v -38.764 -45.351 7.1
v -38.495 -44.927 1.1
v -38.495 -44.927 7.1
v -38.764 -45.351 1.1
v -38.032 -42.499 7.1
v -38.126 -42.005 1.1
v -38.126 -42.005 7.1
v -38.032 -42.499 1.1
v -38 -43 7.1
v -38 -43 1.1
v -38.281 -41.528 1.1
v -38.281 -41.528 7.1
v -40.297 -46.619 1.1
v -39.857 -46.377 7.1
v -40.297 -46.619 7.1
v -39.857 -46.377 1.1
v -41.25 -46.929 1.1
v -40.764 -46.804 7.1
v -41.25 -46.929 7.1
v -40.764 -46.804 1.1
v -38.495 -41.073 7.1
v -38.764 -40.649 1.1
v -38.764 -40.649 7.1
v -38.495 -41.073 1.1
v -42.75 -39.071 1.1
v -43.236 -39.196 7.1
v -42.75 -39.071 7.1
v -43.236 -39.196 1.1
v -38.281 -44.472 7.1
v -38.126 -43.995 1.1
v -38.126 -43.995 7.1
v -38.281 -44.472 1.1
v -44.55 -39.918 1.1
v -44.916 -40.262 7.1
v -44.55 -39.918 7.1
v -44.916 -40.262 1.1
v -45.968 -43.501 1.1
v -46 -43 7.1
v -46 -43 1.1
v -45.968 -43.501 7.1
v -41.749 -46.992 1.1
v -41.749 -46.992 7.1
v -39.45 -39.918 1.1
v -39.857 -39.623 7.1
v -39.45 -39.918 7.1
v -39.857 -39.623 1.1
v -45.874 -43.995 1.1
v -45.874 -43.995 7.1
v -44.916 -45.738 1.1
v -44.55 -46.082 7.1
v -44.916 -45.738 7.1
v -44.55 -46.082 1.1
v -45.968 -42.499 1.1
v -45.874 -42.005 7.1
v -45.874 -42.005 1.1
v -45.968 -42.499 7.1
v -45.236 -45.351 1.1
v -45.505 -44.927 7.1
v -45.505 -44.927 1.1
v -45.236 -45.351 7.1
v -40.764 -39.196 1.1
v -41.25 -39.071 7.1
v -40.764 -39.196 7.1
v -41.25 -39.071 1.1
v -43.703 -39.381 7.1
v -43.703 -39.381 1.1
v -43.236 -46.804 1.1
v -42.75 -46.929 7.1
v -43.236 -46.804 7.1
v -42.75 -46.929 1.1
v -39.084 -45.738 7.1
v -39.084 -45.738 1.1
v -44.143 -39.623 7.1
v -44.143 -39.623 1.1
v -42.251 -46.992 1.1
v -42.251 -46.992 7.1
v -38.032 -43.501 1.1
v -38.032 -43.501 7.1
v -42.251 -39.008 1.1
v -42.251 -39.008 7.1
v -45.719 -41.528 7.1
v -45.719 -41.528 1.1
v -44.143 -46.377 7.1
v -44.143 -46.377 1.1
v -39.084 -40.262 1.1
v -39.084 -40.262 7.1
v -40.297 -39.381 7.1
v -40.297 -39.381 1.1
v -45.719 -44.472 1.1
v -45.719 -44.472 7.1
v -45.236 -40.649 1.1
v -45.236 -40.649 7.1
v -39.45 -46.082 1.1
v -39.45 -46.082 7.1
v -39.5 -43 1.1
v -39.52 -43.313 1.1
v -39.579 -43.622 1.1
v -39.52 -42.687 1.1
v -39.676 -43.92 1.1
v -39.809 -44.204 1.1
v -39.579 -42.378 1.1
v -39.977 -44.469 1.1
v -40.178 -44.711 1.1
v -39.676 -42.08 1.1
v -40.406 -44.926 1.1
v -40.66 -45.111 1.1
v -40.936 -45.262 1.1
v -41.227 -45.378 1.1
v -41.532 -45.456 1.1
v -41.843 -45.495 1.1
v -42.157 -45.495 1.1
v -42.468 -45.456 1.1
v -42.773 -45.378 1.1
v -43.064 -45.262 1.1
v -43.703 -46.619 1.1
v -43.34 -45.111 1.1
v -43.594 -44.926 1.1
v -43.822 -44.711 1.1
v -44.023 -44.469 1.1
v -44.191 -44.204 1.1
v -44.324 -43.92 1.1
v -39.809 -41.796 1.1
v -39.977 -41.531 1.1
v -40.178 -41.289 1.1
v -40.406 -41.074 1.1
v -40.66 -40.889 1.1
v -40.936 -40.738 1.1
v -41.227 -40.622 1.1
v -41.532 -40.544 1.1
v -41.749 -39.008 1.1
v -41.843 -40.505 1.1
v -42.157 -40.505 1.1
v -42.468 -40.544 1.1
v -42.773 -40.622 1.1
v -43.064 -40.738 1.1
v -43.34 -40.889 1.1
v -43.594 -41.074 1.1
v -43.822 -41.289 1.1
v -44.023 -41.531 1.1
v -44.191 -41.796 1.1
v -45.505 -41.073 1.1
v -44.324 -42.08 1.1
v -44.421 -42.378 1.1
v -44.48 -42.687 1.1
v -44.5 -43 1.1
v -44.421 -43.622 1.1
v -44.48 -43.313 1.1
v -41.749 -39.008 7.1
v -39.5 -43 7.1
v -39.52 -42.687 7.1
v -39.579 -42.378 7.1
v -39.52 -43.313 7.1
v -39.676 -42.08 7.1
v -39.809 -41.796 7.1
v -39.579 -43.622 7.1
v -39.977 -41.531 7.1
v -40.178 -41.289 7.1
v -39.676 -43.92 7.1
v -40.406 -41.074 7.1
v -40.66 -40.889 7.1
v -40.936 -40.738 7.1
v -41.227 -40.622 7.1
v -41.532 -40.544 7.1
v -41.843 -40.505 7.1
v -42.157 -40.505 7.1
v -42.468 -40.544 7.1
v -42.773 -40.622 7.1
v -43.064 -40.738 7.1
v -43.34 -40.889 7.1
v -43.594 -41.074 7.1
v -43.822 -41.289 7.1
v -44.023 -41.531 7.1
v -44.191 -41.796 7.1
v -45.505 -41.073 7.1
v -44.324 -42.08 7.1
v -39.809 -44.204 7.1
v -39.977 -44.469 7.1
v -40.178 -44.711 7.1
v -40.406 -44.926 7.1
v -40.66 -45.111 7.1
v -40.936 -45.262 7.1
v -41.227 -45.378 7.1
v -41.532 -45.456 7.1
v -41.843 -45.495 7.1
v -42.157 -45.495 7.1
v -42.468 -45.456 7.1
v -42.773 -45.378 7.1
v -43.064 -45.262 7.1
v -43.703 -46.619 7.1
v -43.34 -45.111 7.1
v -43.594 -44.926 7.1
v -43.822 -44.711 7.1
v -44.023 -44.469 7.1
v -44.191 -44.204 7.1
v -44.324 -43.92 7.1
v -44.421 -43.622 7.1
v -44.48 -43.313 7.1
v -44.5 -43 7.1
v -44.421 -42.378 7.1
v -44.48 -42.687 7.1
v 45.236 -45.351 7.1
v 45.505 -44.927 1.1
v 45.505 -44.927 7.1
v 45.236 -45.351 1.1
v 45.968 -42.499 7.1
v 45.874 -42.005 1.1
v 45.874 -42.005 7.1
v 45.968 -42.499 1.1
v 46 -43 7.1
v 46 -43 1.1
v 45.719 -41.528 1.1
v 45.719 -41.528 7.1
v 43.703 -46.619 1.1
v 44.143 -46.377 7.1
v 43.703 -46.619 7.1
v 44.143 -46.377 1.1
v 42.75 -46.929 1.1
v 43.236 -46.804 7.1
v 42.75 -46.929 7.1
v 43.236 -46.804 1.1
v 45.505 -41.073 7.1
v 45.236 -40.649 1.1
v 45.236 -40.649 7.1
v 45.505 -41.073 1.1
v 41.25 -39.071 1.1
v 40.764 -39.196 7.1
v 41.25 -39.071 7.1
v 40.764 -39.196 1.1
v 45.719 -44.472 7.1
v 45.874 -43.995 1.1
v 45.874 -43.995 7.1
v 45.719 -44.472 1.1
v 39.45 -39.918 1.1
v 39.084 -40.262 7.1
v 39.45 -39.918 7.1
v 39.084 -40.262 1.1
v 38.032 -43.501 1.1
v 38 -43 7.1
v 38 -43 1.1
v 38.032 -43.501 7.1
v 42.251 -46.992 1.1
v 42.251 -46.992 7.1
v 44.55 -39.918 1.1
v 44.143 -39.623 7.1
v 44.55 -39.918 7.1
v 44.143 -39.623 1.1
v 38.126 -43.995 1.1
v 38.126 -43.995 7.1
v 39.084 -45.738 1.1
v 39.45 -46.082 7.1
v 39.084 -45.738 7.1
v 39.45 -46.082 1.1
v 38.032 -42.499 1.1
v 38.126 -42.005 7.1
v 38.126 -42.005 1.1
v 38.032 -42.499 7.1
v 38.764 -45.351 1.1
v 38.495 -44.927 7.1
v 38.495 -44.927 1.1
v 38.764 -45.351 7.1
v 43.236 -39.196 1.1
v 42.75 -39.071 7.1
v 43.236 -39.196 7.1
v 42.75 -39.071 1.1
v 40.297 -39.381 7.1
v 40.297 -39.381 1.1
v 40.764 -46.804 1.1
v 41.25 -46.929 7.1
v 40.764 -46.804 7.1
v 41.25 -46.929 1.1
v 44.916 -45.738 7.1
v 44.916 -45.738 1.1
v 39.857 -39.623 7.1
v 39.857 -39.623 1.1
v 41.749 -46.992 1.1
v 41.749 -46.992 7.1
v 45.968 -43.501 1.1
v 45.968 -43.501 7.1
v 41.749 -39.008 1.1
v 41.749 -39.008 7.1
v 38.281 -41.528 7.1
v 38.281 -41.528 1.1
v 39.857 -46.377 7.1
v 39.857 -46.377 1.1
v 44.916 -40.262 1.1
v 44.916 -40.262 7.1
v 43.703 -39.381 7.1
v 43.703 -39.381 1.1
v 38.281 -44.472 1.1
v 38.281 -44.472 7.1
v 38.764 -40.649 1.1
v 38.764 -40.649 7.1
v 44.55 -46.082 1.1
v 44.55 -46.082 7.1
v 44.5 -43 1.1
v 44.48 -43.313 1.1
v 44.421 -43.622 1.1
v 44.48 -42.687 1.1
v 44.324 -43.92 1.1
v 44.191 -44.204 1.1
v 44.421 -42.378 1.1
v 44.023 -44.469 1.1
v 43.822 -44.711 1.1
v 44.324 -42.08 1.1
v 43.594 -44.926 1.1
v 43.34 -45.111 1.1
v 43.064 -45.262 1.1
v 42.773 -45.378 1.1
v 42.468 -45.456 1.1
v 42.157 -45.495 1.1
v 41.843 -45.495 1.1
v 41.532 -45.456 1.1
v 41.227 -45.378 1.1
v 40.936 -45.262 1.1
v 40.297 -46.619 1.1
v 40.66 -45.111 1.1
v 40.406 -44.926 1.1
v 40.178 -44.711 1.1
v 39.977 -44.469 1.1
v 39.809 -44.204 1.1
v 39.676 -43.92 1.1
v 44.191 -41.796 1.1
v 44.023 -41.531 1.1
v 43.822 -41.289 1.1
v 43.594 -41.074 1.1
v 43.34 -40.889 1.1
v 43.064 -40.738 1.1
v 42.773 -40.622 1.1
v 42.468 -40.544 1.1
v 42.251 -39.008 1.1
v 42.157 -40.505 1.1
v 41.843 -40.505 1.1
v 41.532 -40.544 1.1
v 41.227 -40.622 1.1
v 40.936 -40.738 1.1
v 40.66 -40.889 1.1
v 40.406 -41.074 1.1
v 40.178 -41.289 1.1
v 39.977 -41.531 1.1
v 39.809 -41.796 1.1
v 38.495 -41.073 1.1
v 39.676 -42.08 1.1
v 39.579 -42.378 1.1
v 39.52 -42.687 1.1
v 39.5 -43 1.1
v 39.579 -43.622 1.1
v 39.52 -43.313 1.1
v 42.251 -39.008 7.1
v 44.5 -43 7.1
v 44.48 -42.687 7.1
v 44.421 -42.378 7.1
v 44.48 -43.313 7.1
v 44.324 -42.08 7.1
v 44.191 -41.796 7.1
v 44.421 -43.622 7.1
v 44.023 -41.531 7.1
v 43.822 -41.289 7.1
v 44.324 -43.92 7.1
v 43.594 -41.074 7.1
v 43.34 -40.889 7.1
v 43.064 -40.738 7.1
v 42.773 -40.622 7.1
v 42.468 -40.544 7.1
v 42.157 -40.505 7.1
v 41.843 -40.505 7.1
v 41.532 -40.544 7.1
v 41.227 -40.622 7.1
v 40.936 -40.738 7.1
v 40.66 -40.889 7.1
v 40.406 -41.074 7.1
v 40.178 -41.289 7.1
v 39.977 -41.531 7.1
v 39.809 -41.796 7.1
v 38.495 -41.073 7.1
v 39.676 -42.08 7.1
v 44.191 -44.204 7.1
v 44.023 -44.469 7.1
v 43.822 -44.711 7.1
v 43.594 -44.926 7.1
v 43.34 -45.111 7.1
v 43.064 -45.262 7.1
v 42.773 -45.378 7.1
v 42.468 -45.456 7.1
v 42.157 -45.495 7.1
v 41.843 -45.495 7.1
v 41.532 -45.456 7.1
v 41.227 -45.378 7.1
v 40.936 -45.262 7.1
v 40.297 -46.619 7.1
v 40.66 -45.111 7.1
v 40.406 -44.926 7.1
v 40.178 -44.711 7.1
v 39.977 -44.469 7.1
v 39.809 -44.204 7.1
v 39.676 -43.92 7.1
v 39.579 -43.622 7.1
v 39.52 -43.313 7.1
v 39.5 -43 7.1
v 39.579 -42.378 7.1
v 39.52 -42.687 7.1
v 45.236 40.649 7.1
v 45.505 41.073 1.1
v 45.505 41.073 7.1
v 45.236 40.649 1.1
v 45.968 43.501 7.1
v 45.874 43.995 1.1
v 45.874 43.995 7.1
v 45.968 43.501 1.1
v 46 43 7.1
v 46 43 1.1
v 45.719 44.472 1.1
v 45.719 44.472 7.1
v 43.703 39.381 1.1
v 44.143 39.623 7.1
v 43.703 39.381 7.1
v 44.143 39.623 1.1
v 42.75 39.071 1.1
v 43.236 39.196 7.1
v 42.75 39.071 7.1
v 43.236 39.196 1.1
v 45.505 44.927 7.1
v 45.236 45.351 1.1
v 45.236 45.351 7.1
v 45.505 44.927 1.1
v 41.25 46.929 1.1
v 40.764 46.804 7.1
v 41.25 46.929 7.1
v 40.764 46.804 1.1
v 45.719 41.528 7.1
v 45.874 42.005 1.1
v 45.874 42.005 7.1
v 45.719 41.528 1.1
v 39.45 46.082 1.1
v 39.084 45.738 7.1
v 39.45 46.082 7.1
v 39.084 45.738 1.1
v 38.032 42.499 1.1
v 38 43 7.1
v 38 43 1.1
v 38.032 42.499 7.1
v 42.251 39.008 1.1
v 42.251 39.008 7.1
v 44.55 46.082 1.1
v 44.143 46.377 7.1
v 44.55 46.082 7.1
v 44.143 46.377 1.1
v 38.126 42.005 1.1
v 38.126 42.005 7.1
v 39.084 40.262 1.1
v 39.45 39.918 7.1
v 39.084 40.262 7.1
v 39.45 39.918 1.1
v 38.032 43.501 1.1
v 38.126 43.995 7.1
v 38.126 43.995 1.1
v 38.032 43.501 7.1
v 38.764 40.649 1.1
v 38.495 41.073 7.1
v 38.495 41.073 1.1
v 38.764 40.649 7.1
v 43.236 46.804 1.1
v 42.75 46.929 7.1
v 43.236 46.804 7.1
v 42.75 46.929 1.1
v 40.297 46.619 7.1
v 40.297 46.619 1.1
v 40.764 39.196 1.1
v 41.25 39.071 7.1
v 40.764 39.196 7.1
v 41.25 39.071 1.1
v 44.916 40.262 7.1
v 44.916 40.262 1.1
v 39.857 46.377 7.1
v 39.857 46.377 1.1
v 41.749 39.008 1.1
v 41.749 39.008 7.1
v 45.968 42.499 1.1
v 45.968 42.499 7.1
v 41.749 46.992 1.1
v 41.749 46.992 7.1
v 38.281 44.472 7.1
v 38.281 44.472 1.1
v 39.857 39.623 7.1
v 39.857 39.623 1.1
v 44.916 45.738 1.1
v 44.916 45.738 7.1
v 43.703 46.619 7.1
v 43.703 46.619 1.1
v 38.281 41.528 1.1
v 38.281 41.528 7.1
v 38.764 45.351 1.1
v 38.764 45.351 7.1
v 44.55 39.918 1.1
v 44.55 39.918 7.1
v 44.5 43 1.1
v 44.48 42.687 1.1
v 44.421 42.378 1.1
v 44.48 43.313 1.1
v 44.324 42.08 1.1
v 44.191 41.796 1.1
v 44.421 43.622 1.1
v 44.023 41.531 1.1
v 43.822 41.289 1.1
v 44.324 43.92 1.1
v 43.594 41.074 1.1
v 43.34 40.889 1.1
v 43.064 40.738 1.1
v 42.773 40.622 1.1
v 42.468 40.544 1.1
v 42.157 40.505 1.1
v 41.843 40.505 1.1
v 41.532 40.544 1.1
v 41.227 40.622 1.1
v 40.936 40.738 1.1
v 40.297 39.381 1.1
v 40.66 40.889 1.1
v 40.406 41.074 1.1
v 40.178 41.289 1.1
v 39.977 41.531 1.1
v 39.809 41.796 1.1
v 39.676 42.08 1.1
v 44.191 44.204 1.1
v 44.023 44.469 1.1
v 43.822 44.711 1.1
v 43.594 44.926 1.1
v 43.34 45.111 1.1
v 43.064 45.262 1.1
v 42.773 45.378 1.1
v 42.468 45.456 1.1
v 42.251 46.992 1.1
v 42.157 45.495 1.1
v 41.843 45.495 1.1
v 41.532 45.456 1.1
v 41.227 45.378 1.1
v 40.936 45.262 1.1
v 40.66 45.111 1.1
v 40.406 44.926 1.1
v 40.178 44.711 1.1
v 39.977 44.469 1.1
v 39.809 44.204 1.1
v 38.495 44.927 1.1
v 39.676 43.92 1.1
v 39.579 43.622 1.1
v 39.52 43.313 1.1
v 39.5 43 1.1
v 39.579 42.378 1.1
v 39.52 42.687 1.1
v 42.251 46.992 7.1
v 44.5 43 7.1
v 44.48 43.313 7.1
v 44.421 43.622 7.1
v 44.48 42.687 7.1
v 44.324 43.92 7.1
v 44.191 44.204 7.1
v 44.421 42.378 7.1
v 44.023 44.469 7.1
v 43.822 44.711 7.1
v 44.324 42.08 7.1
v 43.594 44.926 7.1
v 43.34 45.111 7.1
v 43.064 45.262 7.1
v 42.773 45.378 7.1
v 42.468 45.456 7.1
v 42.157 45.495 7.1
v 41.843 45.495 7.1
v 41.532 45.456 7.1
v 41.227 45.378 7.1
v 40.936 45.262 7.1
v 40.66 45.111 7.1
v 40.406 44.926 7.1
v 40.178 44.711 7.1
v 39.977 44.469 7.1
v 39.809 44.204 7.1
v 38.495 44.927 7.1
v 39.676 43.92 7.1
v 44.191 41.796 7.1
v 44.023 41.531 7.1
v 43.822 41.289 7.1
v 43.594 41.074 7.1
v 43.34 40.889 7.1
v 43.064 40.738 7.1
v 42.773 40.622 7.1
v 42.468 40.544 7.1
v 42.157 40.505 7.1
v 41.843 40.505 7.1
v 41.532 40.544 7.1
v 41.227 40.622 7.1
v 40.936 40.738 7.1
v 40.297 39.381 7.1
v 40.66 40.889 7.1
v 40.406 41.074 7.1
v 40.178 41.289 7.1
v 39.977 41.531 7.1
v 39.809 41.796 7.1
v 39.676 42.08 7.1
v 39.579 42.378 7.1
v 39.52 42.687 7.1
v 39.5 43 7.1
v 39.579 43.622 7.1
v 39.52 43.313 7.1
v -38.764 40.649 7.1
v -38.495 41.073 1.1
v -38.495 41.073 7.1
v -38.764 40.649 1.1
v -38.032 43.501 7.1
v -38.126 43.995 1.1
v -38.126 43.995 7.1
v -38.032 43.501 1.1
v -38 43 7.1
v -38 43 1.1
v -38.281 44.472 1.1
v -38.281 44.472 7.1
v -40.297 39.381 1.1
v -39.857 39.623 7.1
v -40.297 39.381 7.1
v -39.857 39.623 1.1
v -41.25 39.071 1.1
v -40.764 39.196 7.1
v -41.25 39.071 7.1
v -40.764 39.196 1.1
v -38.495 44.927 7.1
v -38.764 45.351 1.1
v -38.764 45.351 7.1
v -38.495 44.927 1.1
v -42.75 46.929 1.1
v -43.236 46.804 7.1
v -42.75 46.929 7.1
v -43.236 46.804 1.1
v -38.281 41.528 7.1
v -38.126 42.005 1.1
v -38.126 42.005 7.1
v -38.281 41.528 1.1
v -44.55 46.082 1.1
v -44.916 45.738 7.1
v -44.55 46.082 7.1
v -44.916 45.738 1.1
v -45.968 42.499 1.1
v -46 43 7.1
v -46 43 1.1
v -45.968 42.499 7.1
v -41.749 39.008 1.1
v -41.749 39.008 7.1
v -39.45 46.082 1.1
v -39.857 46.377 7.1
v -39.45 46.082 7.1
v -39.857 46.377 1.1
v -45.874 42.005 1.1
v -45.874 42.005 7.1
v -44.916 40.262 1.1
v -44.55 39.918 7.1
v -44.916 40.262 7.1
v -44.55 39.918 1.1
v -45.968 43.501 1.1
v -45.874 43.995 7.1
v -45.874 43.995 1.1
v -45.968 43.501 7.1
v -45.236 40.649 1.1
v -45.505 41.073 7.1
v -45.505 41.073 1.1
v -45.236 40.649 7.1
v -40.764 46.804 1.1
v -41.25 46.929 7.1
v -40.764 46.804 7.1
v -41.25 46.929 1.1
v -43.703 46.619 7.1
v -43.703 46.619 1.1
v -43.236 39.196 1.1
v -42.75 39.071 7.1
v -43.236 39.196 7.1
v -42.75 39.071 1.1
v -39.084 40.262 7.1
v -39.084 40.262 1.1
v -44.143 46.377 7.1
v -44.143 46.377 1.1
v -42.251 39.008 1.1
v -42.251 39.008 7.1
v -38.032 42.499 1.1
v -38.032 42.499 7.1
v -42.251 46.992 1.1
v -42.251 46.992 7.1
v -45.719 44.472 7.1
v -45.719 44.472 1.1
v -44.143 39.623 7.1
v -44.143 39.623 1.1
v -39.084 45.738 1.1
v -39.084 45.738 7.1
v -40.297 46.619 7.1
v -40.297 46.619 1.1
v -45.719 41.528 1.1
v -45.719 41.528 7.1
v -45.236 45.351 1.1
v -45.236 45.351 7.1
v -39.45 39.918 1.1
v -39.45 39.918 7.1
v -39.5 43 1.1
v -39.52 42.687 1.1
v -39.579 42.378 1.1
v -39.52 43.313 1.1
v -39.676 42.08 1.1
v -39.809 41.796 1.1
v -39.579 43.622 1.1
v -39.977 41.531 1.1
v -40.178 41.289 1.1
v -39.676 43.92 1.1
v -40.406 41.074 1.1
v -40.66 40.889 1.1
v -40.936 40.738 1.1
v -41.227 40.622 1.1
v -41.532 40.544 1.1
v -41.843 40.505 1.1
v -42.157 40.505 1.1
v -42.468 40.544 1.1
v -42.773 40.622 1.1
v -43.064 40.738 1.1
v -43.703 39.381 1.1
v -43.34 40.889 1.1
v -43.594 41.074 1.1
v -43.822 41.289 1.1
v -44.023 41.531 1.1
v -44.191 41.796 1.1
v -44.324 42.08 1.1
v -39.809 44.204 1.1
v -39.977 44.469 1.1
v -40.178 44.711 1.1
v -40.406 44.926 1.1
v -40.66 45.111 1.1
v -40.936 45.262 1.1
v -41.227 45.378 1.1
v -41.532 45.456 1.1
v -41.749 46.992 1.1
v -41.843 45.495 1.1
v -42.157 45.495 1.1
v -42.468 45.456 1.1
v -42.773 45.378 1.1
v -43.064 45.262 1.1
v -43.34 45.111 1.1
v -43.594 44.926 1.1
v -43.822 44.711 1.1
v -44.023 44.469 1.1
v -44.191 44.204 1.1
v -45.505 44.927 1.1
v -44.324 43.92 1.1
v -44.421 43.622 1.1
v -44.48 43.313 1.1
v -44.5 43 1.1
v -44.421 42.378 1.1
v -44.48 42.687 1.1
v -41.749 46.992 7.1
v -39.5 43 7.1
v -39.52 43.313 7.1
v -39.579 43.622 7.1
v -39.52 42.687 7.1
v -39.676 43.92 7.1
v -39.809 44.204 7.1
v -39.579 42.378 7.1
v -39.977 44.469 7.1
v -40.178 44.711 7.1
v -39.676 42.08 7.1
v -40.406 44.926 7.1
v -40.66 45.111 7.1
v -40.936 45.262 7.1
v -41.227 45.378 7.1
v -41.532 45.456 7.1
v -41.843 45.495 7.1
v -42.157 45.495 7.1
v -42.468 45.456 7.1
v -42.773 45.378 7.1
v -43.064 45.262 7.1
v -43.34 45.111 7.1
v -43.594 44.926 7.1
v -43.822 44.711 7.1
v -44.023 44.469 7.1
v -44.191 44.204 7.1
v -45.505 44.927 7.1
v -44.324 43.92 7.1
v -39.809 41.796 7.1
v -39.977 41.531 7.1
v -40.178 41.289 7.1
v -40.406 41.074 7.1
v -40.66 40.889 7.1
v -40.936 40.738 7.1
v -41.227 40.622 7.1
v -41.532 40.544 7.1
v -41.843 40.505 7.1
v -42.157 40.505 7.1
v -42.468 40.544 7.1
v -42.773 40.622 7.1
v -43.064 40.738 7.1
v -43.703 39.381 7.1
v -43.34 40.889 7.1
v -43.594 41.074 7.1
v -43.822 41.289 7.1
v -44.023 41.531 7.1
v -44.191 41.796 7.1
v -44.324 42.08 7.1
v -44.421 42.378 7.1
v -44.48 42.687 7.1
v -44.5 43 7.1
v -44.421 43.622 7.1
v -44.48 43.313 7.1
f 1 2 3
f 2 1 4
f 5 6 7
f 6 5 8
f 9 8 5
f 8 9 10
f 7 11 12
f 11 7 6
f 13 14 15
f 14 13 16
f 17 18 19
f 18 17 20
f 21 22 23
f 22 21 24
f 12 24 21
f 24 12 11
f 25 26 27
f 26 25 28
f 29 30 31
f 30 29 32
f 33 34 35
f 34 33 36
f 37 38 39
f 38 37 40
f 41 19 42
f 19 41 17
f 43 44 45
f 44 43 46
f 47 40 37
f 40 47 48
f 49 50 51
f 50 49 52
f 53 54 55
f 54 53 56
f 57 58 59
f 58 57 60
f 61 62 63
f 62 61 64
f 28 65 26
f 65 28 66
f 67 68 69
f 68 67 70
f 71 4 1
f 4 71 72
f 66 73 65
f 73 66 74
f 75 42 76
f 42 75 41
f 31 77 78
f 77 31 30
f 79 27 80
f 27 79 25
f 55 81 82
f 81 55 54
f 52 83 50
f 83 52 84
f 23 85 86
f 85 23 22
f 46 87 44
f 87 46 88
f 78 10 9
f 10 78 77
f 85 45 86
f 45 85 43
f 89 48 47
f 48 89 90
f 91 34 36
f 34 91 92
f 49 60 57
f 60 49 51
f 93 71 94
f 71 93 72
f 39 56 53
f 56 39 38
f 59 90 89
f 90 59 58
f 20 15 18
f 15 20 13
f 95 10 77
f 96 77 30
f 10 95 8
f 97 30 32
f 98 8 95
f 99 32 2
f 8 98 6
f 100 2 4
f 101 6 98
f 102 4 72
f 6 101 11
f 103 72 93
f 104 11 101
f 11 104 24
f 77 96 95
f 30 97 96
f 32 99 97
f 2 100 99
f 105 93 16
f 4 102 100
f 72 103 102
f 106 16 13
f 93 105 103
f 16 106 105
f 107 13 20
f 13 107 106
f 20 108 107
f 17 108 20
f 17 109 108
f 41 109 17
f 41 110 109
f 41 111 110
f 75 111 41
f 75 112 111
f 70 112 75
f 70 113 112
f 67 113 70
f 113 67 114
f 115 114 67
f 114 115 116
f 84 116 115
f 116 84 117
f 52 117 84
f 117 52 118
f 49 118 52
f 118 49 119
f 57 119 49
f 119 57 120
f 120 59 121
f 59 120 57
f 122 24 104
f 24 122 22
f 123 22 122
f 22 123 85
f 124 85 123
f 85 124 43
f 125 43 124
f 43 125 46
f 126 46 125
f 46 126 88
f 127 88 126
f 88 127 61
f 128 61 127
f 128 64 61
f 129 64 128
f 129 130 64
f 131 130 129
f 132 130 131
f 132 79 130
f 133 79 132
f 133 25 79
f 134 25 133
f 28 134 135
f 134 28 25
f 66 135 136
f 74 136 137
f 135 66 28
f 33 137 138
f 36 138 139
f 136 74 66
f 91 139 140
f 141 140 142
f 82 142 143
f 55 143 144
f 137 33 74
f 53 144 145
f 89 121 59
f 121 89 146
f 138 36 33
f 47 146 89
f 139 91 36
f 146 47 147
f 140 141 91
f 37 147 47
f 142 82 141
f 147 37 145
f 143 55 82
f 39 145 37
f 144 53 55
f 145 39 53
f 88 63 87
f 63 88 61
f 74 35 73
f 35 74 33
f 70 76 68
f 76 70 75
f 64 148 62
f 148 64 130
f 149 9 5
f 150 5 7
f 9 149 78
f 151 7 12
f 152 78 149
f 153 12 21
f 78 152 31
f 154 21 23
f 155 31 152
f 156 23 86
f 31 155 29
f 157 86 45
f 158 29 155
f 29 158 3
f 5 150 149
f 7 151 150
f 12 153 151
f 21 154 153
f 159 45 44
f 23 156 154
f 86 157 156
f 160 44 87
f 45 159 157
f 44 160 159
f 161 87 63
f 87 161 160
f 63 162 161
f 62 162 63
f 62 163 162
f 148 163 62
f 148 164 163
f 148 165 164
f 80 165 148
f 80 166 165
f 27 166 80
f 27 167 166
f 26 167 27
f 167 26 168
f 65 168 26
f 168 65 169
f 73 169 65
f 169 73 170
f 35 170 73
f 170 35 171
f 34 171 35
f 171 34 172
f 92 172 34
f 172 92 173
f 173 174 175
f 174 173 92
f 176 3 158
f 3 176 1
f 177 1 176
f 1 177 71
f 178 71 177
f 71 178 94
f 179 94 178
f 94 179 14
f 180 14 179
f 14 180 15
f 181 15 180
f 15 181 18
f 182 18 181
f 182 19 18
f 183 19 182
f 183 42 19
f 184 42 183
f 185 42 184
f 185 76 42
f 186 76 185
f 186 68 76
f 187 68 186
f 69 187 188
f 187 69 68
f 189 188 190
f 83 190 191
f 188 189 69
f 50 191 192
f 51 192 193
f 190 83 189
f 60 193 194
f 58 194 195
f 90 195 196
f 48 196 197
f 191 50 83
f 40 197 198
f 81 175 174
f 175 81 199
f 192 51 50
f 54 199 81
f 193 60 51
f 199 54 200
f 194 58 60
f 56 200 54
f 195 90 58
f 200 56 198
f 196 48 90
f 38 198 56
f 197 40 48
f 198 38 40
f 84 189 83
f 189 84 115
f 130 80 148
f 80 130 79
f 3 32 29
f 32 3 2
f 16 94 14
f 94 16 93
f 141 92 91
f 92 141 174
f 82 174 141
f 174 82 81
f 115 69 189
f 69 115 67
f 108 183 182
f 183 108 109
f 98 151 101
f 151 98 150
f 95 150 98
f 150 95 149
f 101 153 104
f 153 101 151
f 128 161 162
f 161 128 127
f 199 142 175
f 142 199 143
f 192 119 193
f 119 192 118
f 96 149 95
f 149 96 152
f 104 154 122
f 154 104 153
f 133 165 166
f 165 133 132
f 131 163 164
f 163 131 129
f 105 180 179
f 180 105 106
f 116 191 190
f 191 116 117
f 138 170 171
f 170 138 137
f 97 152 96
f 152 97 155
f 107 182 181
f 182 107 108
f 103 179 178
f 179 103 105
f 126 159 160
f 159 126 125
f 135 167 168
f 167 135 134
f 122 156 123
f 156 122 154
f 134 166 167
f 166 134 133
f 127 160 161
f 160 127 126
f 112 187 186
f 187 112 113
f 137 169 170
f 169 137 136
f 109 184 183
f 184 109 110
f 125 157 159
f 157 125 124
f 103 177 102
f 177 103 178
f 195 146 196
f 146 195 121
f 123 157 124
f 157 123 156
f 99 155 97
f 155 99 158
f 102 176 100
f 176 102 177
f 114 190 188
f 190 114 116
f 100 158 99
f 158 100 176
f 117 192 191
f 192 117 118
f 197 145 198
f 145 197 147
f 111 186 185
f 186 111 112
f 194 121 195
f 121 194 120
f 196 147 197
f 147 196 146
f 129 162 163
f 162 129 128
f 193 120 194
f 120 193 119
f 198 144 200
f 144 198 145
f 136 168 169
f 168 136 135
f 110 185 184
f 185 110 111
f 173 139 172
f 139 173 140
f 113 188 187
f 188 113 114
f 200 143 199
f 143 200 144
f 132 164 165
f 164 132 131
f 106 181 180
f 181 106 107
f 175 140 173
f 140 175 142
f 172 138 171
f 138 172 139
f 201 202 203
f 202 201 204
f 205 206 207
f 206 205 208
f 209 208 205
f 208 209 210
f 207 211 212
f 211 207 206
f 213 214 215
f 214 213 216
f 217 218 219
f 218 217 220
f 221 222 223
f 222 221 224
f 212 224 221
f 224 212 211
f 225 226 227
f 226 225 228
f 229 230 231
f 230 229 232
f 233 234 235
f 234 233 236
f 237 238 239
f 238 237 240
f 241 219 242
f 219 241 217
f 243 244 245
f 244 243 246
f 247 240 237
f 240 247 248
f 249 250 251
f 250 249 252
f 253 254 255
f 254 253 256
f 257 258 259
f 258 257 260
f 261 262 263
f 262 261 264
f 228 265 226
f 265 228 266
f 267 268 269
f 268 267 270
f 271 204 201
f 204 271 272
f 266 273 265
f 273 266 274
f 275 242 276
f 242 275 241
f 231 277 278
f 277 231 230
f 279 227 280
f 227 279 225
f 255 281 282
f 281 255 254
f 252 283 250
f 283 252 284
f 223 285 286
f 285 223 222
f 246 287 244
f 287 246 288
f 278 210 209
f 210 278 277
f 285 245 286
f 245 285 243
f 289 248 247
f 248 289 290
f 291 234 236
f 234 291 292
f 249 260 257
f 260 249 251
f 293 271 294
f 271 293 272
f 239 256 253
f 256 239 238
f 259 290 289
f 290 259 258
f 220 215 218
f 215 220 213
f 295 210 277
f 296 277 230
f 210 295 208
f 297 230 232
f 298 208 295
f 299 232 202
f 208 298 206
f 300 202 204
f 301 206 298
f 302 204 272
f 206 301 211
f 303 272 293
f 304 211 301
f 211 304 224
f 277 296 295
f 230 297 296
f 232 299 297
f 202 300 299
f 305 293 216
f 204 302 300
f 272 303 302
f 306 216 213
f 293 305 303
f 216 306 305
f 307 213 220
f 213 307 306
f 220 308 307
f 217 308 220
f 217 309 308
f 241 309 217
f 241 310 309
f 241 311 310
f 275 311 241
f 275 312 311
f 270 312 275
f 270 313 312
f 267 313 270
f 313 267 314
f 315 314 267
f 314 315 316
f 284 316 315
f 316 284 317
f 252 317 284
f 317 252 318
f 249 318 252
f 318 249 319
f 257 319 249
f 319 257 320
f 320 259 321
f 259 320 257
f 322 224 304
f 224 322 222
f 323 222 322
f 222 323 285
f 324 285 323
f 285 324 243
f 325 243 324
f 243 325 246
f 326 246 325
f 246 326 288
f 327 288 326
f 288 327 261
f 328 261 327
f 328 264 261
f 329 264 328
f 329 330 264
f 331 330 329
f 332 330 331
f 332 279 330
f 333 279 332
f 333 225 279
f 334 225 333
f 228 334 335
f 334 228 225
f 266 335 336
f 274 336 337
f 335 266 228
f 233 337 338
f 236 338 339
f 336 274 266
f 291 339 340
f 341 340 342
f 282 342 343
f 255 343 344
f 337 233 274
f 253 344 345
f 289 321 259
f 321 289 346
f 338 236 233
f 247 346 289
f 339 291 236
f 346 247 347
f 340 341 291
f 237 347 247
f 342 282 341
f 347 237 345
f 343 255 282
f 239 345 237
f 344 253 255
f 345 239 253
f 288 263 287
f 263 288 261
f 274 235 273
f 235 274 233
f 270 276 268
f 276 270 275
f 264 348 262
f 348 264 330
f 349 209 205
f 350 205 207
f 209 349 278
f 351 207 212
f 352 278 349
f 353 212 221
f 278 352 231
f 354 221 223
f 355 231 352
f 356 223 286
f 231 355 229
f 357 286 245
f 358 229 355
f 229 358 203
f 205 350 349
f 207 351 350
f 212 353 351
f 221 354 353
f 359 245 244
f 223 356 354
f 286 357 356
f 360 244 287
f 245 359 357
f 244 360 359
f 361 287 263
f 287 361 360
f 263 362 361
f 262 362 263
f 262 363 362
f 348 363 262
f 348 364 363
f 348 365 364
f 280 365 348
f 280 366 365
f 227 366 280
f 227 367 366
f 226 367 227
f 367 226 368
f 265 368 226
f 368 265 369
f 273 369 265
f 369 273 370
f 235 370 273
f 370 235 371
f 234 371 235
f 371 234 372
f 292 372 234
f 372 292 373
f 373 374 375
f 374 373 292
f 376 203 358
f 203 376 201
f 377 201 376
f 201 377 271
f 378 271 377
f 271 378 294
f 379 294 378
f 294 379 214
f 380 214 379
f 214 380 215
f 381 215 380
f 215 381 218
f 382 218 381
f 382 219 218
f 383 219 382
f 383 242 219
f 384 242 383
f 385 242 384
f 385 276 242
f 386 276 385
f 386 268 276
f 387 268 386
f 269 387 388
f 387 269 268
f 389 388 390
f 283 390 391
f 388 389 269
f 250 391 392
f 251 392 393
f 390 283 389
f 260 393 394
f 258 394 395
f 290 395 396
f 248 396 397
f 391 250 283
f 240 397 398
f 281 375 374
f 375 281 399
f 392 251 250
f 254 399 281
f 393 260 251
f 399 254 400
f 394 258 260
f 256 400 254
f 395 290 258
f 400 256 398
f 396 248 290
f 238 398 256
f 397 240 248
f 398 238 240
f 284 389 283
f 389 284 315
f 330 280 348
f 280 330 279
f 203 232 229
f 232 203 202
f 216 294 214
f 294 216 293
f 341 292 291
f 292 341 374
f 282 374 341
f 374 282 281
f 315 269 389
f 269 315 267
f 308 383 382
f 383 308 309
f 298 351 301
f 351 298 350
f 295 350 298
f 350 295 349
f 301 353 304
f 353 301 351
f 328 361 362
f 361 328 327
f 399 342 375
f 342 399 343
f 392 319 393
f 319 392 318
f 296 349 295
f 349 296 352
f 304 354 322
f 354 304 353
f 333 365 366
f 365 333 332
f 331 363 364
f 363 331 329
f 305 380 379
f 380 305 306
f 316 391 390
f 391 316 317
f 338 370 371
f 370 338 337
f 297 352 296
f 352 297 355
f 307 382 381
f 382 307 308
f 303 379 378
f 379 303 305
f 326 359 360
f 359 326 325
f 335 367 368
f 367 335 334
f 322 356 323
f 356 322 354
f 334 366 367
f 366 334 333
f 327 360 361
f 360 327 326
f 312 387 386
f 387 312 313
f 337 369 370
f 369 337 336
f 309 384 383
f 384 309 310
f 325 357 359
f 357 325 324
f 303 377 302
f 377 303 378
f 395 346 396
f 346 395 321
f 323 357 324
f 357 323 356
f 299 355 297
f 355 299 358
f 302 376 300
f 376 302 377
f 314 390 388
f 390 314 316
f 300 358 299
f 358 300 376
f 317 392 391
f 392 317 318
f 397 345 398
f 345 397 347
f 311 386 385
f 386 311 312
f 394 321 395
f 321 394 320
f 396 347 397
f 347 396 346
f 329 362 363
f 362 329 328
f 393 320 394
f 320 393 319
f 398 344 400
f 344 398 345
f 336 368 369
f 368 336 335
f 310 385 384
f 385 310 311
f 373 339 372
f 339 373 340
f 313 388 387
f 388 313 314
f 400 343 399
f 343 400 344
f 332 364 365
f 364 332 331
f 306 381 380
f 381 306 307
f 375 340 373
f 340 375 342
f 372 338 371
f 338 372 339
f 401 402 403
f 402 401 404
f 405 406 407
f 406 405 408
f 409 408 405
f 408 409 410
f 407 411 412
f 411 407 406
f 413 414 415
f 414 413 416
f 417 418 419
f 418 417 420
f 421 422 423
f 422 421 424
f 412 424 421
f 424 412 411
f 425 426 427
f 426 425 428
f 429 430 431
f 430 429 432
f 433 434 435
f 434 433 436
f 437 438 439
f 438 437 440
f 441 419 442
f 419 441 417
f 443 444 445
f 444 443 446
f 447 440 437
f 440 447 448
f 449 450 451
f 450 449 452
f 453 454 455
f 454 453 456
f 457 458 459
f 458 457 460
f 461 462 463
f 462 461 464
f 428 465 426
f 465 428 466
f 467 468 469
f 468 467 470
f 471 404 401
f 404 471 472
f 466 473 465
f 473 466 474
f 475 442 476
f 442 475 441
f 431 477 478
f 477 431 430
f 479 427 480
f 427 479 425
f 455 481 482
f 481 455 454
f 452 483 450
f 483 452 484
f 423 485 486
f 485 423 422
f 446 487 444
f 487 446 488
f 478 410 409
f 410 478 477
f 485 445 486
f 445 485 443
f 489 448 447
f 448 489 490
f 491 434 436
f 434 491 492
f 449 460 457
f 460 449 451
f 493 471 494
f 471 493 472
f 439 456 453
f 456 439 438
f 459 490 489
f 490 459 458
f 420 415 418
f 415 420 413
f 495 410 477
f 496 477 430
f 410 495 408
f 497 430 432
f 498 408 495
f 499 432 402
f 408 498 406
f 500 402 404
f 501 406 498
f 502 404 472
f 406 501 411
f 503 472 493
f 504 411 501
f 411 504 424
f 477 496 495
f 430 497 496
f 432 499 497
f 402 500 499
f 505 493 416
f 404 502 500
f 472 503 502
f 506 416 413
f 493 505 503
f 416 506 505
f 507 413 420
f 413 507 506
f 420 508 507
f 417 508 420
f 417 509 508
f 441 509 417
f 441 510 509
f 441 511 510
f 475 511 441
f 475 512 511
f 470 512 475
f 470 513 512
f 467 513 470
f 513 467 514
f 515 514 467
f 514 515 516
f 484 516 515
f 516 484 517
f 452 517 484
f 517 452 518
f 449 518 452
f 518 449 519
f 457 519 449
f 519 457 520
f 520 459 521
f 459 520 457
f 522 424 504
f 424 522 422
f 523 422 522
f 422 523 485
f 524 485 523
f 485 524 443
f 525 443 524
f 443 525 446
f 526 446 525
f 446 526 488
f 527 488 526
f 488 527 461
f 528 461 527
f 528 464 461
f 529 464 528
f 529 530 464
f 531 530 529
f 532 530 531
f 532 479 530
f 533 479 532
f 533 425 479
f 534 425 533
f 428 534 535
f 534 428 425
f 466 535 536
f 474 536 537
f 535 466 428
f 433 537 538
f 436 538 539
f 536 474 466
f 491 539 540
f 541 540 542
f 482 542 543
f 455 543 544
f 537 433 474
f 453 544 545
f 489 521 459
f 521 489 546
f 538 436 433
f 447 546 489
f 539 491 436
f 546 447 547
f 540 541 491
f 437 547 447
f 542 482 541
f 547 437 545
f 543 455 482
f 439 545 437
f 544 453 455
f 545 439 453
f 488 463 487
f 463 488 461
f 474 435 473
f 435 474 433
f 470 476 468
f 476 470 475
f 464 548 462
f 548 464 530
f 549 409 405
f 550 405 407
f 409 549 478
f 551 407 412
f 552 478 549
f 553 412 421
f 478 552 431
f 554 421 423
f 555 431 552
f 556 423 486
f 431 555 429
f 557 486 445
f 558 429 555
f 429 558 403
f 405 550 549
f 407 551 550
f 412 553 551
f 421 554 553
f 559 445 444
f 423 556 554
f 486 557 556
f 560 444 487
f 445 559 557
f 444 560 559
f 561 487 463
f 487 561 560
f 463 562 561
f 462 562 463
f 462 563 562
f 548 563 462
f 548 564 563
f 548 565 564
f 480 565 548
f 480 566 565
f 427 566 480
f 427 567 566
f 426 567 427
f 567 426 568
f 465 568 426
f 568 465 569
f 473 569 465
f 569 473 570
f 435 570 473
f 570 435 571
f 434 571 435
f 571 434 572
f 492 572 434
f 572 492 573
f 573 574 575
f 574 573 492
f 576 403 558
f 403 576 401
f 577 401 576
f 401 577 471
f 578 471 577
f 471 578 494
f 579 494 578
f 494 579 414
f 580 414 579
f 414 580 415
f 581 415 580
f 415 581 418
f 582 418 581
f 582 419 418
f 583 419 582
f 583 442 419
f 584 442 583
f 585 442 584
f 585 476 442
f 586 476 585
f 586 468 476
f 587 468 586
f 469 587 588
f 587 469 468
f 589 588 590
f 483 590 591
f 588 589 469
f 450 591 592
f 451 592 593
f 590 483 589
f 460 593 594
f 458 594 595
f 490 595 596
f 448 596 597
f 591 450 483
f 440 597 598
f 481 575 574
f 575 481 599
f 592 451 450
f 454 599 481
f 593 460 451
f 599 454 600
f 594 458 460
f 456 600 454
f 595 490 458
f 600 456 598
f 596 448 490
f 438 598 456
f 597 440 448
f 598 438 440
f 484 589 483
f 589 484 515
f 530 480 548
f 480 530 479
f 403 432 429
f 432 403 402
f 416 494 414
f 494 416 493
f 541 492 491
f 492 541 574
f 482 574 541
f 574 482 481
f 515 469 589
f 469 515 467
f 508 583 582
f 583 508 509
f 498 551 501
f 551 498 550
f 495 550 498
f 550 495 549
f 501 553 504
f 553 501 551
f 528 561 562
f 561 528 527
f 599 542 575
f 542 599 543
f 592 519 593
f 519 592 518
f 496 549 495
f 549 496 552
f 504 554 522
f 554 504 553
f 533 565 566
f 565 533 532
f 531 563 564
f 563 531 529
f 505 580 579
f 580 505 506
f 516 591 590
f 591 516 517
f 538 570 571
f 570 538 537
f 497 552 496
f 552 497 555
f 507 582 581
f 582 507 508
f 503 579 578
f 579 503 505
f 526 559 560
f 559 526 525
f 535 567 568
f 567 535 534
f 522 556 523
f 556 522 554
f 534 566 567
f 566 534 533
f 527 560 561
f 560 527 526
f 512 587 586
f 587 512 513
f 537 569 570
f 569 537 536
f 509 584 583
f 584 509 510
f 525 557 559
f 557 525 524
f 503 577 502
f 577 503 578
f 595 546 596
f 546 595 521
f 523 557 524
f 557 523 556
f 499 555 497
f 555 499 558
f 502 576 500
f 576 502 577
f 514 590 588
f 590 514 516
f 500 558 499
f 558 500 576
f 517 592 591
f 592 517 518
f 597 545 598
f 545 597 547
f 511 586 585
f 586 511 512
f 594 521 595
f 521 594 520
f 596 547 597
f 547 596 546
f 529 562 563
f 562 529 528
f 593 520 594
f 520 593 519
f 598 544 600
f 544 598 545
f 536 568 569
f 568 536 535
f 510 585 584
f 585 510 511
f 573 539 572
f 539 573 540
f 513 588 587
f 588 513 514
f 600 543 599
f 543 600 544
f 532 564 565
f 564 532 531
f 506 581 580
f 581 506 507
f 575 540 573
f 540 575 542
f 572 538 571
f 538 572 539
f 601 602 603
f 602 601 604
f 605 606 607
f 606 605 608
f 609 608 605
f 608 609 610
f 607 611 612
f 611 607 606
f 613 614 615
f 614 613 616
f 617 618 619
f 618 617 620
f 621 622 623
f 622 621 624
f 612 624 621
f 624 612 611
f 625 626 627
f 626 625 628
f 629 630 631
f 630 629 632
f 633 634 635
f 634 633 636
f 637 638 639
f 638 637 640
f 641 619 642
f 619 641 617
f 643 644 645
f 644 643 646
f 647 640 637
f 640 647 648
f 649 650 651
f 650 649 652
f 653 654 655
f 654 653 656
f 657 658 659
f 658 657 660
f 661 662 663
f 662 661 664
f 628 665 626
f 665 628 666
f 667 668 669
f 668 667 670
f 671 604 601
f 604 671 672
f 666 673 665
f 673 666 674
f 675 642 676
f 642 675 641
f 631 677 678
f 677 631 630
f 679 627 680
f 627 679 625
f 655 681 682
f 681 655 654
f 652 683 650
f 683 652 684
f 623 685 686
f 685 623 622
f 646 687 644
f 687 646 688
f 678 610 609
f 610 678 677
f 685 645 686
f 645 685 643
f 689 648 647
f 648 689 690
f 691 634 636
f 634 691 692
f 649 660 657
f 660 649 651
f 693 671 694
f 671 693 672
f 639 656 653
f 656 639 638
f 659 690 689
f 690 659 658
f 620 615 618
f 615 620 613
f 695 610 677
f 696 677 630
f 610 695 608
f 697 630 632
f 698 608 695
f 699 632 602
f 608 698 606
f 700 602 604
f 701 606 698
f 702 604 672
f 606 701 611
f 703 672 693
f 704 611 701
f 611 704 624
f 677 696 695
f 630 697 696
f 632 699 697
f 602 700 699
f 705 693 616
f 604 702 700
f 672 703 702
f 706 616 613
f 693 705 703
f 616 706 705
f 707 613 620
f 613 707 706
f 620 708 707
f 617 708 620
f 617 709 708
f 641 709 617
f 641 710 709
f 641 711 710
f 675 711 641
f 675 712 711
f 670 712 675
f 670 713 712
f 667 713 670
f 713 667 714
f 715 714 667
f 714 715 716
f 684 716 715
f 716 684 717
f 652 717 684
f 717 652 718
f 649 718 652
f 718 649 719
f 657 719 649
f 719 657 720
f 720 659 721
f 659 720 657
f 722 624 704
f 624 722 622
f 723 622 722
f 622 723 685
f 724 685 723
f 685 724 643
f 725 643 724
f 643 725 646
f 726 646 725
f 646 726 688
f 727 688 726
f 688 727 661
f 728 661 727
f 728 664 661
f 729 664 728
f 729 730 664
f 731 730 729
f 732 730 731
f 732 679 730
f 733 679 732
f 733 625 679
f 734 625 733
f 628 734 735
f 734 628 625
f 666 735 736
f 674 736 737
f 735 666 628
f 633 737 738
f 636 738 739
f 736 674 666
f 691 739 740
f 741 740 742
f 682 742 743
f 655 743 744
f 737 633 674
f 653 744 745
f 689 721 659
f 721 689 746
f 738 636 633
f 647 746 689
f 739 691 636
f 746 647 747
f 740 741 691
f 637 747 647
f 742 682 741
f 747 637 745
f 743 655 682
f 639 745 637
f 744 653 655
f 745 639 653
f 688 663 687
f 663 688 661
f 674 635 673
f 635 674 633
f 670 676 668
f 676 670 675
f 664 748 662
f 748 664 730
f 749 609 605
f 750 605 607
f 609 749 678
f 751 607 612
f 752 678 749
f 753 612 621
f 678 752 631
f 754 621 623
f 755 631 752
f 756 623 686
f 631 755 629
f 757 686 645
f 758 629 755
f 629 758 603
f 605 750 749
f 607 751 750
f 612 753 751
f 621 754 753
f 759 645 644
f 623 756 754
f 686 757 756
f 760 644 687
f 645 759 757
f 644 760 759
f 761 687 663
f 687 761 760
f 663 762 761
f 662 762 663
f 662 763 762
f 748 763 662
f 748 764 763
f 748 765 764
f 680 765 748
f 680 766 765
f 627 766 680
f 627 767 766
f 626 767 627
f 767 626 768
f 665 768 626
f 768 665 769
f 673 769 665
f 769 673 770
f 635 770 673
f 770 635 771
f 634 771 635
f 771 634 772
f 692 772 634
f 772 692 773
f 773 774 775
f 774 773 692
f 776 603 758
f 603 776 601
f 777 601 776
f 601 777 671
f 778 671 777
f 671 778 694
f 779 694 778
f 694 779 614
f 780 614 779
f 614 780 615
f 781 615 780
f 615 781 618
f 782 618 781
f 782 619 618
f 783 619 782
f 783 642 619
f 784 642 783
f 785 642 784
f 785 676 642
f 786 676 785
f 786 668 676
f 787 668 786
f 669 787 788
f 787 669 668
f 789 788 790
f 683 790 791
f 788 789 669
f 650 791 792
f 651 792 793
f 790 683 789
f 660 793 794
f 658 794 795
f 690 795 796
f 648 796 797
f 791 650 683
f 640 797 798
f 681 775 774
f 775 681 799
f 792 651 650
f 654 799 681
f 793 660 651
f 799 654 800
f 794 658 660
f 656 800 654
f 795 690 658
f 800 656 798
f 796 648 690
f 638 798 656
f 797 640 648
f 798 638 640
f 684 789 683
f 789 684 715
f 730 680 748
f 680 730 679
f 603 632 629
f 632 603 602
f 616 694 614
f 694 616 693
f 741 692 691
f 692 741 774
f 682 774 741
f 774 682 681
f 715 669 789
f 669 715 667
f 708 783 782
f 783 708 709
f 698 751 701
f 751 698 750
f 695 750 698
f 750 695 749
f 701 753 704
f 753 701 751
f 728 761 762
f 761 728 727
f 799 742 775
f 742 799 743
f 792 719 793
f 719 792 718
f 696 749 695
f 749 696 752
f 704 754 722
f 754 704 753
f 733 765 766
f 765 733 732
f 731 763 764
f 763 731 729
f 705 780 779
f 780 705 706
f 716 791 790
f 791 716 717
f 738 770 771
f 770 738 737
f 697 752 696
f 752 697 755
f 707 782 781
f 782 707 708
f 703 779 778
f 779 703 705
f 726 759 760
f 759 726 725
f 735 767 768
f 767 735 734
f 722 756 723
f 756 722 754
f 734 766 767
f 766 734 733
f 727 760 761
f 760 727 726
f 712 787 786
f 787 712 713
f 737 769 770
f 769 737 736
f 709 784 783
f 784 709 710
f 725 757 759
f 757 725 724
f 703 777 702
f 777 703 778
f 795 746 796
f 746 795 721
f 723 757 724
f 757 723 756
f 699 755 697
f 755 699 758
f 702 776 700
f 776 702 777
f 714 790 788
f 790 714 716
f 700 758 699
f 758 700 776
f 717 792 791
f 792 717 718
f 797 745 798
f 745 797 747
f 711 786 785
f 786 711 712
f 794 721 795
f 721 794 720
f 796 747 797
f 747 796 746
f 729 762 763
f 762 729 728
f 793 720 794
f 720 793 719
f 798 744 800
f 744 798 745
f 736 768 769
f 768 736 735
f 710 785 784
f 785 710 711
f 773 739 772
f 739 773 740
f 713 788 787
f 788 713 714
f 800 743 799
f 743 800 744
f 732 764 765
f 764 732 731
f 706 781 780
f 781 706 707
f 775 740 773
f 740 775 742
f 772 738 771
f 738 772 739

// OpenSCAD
// file: ../robot_settings.scad
main_box_x = 100; // 96
main_box_y = 102;
main_box_z = 74; // 74.5

lfp_main_box_x = 65;
lfp_main_box_y = 151;
lfp_main_box_z = 95;

wall_thickness = 2;

rail_gap = 2;
rail_inset = 7;

rail_thickness = 7;
rail_length = 250;
rail_width = 250;

raspberry_pi_screw_seperation_y = 57;
raspberry_pi_screw_seperation_z = 48;
raspberry_pi_peg_h = 5;

battery_box_peg_h = 6;
battery_box_peg_d = 8;
battery_box_peg_cutout = 5;

gears_module = 1;
pinion_gear_teeth = 32;
pinion_gear_width = 5;
pinion_gear_bore = 8;

gears_setback_distance = 25;
gear_post_height = 2 * pinion_gear_width + rail_thickness + 8 ;

steering_motor_mount_x = 45;
steering_motor_mount_y = 36;
steering_motor_mount_z = 18;
steering_motor_mount_setback_distance = gears_setback_distance + 16;

dc_motor_drivertype = "Teyleten"; // Teyleten
isAdafruit = (dc_motor_drivertype == "Adafruit");

drv8871_x = isAdafruit ? 20.3 : 21.6;
drv8871_y = isAdafruit ?  24 : 25;

drv8871_z = 2;
drv8871_screw_d = 2.5;
drv8871_solder_points_z = 2;

drv8871mount_edge_x = 1.5;
drv8871mount_edge_wall = 3;
drv8871mount_z = 5;
drv8871mount_x = drv8871_x +  drv8871mount_edge_wall - 2* drv8871mount_edge_x;
drv8871mount_y = 19;

drv8871_screw_distance = 15.64;
drv8871_solder_points_d = 1.66;
drv8871_solder_offset_y = 4.4;
drv8871_solder_inner_points_distance = 5;
drv8871_solder_outer_points_distance = 12;

dc_motor_75_1_housing_minus_encoder_z = 53.8;
dc_motor_75_1_encoder_z = 14.75;
dc_motor_housing_minus_encoder_z = 48;
dc_motor_encoder_z = 9.33;
dc_motor_encoder_wheel_d = 13.4;
dc_motor_encoder_wheel_thickness = 5;
dc_motor_encoder_wheel_gap = 3;
dc_motor_encoder_circuit_thickness = 2;
dc_motor_cutout_d = 24.8;
dc_motor_cutout_z = 19.5;


M3_shaft_d = 2.82;

dc_motor_screw_head_z = 2;
dc_motor_screw_head_d = 5.6;
dc_motor_screw_d = 3.2;
dc_motor_screw_offset = 8.5;

dc_motor_axle_ring_z = 3;
dc_motor_axle_ring_d = 7.2;
dc_motor_axle_cutout_d = 4.2;
dc_motor_axle_cutout_z = 10;
dc_motor_axle_notch_cutout = 0.4;
dc_motor_axle_notch_cutout_z = 6;

pdmount_x = 20;
pdmount_y = 30;
pdmount_z = 2;
pdmount_edge_x = 1.5;
pdmount_edge_wall = 3;

steering_shaft_z = 45;
steering_shaft_d = 7;
steering_shaft_motor_fitting_d = 9;
coupler_length = 24.6;
coupler_diameter = 14;
coupler_screw_d = 4;
coupler_screw_z_offset = 5;
coupler_gear_side_insert = 12.6;
steering_shaft_with_coupler_z = steering_shaft_z - coupler_gear_side_insert;

lidar_mount_y = 110;
lidar_mount_x = 65 + 20;
lidar_narrow_screws = 40;
lidar_wide_screws = 56;
lidar_front_to_back_screws = 70;
lidar_screw_d = 3;
lidar_circuitboard_x = 20;
lidar_circuitboard_y = 35;
lidar_circuitboard_z = 1.2;
lidar_cord_length = 29;

ball_bearing_height = 7;
ball_bearing_outer_diameter = 22;
ball_bearing_inner_diameter = 8;

M4_diameter = 5.1;
M3_diameter = 2.9;
M3_length = 35;
M3_cap_length= 3;
M3_cap_diameter = 5.44;

suspension_spring_outer_diameter = 8;
suspension_spring_inner_diameter = 5.3;

armature_holder_height = 20;
armature_holder_thickness = 8;
pull_bar_peg_r = 3.2;
apparatus_locking_peg_d = 4;

rack_module = 1;
rack_length = main_box_x;
rack_height = 5;
rack_width = 10;
rack_teeth = 30;
rack_bore = 3;

pull_bar_length = rail_width / 2 - rack_length + 1;

// tire hardware
axle_length = 24 + ball_bearing_height; 
axle_reciever_inner_diameter = 8.2;
axle_reciever_outer_diameter = 12;
axle_reciever_length = 18.8;
axle_notch_length = 15;
axle_notch_cutout = 2.4;

// power distribution bar
power_bar_cutout_x = 96;
power_bar_y = 19.1;
power_bar_z = 1.5;
power_bar_screw_distance = 91.4;
power_bar_screw_d = 2.8;
power_bar_standoff_z = 5;
power_bar_standoff_d = 6.83;

pico_expander_width = 63;
pico_expander_height = 57;
pico_screw_hole_offset = 3;
pico_screw_hole_d = 2.5;

usbhub_thickness = 11.7;
usbhub_depth = 37.5;
usbhub_width = 86.7;
usbhub_end_port_width = 14.8;
usbhub_end_port_height = 12;
usbhub_front_face_safe_zone_left = 15;
usbhub_front_face_safe_zone_right = 14.8;

switch_w = 16;
switch_cutout_d = 12.2;
switch_bump_h = 2;
switch_bump_l = 18.2;

i2c_mount_thickness = 3;
i2c_w = 28;
i2c_l = 28;
i2c_circuitboard_thickness = 1.23;
i2c_bottom_notch_w = 14.35;
i2c_bottom_notch_depth = 1;
i2c_screw_hole_d = 1.9;
i2c_screw_hole_offset = 1.4;
i2c_pin_l = 11;
i2c_pin_d = 0.8;
i2c_pin_offset = 1.5;
i2c_pin_separation = 2.5;
i2c_all_pins_l = 8.3;
i2c_screen_thickness = 1.88;
i2c_screen_w = 14.6;
i2c_screen_d = 27;
i2c_screen_offset = 4.1;
// main file
   include <../robot_settings.scad>
   $fn = 50;
 
 module battery_box_peg_mounts(
  show_mounts = true,
  show_points = false) 
  {

if (show_mounts) 
{
  // temporary base platform
  //translate([0, 0, battery_box_peg_d / 2 + 3])
  //cube([main_box_x, main_box_y, 2]);
  
    translate([-main_box_x / 2, -main_box_y / 2, battery_box_peg_d / 2 + .1])
    {
     color("green")
    translate([battery_box_peg_d, battery_box_peg_d, 0])
      difference() {
        cylinder(h = battery_box_peg_h, d = battery_box_peg_d, center = true);
       translate([0, 0, -.1])
        cylinder(h = battery_box_peg_h + 1, d = battery_box_peg_cutout, center = true); 
      }

  color("red")
    translate([-battery_box_peg_d + main_box_x, battery_box_peg_d, 0])
      difference() {
        cylinder(h = battery_box_peg_h, d = battery_box_peg_d, center = true);
       translate([0, 0, -.1])
        cylinder(h = battery_box_peg_h + 1, d = battery_box_peg_cutout, center = true); 
      }

  color("white")
    translate([-battery_box_peg_d + main_box_x, -battery_box_peg_d + main_box_y, 0])
      difference() {
        cylinder(h = battery_box_peg_h, d = battery_box_peg_d, center = true);
       translate([0, 0, -.1])
        cylinder(h = battery_box_peg_h + 1, d = battery_box_peg_cutout, center = true); 
      }
     
    translate([battery_box_peg_d, -battery_box_peg_d + main_box_y, 0])
      difference() {
        cylinder(h = battery_box_peg_h, d = battery_box_peg_d, center = true);
       translate([0, 0, -.1])
        cylinder(h = battery_box_peg_h + 1, d = battery_box_peg_cutout, center = true); 
      } 
    }
  }
    if (show_points) {
      // temporary base platform
//     translate([-main_box_x / 2, -main_box_y / 2, 0])
//     cube([main_box_x, main_box_y, 2]);
      
      cutout_offset = .4;
      
      // battery box attachment points
       translate([-main_box_x / 2, -main_box_y / 2,  - .1]) 
      {
        translate([battery_box_peg_d, battery_box_peg_d, 0])
        cylinder(h = battery_box_peg_h, d = battery_box_peg_cutout - cutout_offset);

        translate([-battery_box_peg_d + main_box_x, battery_box_peg_d, 0])
        cylinder(h = battery_box_peg_h, d = battery_box_peg_cutout - cutout_offset);

        translate([-battery_box_peg_d + main_box_x, -battery_box_peg_d + main_box_y, 0])
        cylinder(h = battery_box_peg_h, d = battery_box_peg_cutout - cutout_offset);

        translate([battery_box_peg_d, -battery_box_peg_d + main_box_y, 0])
        cylinder(h = battery_box_peg_h, d = battery_box_peg_cutout - cutout_offset);
       }
   }

}
battery_box_peg_mounts();
